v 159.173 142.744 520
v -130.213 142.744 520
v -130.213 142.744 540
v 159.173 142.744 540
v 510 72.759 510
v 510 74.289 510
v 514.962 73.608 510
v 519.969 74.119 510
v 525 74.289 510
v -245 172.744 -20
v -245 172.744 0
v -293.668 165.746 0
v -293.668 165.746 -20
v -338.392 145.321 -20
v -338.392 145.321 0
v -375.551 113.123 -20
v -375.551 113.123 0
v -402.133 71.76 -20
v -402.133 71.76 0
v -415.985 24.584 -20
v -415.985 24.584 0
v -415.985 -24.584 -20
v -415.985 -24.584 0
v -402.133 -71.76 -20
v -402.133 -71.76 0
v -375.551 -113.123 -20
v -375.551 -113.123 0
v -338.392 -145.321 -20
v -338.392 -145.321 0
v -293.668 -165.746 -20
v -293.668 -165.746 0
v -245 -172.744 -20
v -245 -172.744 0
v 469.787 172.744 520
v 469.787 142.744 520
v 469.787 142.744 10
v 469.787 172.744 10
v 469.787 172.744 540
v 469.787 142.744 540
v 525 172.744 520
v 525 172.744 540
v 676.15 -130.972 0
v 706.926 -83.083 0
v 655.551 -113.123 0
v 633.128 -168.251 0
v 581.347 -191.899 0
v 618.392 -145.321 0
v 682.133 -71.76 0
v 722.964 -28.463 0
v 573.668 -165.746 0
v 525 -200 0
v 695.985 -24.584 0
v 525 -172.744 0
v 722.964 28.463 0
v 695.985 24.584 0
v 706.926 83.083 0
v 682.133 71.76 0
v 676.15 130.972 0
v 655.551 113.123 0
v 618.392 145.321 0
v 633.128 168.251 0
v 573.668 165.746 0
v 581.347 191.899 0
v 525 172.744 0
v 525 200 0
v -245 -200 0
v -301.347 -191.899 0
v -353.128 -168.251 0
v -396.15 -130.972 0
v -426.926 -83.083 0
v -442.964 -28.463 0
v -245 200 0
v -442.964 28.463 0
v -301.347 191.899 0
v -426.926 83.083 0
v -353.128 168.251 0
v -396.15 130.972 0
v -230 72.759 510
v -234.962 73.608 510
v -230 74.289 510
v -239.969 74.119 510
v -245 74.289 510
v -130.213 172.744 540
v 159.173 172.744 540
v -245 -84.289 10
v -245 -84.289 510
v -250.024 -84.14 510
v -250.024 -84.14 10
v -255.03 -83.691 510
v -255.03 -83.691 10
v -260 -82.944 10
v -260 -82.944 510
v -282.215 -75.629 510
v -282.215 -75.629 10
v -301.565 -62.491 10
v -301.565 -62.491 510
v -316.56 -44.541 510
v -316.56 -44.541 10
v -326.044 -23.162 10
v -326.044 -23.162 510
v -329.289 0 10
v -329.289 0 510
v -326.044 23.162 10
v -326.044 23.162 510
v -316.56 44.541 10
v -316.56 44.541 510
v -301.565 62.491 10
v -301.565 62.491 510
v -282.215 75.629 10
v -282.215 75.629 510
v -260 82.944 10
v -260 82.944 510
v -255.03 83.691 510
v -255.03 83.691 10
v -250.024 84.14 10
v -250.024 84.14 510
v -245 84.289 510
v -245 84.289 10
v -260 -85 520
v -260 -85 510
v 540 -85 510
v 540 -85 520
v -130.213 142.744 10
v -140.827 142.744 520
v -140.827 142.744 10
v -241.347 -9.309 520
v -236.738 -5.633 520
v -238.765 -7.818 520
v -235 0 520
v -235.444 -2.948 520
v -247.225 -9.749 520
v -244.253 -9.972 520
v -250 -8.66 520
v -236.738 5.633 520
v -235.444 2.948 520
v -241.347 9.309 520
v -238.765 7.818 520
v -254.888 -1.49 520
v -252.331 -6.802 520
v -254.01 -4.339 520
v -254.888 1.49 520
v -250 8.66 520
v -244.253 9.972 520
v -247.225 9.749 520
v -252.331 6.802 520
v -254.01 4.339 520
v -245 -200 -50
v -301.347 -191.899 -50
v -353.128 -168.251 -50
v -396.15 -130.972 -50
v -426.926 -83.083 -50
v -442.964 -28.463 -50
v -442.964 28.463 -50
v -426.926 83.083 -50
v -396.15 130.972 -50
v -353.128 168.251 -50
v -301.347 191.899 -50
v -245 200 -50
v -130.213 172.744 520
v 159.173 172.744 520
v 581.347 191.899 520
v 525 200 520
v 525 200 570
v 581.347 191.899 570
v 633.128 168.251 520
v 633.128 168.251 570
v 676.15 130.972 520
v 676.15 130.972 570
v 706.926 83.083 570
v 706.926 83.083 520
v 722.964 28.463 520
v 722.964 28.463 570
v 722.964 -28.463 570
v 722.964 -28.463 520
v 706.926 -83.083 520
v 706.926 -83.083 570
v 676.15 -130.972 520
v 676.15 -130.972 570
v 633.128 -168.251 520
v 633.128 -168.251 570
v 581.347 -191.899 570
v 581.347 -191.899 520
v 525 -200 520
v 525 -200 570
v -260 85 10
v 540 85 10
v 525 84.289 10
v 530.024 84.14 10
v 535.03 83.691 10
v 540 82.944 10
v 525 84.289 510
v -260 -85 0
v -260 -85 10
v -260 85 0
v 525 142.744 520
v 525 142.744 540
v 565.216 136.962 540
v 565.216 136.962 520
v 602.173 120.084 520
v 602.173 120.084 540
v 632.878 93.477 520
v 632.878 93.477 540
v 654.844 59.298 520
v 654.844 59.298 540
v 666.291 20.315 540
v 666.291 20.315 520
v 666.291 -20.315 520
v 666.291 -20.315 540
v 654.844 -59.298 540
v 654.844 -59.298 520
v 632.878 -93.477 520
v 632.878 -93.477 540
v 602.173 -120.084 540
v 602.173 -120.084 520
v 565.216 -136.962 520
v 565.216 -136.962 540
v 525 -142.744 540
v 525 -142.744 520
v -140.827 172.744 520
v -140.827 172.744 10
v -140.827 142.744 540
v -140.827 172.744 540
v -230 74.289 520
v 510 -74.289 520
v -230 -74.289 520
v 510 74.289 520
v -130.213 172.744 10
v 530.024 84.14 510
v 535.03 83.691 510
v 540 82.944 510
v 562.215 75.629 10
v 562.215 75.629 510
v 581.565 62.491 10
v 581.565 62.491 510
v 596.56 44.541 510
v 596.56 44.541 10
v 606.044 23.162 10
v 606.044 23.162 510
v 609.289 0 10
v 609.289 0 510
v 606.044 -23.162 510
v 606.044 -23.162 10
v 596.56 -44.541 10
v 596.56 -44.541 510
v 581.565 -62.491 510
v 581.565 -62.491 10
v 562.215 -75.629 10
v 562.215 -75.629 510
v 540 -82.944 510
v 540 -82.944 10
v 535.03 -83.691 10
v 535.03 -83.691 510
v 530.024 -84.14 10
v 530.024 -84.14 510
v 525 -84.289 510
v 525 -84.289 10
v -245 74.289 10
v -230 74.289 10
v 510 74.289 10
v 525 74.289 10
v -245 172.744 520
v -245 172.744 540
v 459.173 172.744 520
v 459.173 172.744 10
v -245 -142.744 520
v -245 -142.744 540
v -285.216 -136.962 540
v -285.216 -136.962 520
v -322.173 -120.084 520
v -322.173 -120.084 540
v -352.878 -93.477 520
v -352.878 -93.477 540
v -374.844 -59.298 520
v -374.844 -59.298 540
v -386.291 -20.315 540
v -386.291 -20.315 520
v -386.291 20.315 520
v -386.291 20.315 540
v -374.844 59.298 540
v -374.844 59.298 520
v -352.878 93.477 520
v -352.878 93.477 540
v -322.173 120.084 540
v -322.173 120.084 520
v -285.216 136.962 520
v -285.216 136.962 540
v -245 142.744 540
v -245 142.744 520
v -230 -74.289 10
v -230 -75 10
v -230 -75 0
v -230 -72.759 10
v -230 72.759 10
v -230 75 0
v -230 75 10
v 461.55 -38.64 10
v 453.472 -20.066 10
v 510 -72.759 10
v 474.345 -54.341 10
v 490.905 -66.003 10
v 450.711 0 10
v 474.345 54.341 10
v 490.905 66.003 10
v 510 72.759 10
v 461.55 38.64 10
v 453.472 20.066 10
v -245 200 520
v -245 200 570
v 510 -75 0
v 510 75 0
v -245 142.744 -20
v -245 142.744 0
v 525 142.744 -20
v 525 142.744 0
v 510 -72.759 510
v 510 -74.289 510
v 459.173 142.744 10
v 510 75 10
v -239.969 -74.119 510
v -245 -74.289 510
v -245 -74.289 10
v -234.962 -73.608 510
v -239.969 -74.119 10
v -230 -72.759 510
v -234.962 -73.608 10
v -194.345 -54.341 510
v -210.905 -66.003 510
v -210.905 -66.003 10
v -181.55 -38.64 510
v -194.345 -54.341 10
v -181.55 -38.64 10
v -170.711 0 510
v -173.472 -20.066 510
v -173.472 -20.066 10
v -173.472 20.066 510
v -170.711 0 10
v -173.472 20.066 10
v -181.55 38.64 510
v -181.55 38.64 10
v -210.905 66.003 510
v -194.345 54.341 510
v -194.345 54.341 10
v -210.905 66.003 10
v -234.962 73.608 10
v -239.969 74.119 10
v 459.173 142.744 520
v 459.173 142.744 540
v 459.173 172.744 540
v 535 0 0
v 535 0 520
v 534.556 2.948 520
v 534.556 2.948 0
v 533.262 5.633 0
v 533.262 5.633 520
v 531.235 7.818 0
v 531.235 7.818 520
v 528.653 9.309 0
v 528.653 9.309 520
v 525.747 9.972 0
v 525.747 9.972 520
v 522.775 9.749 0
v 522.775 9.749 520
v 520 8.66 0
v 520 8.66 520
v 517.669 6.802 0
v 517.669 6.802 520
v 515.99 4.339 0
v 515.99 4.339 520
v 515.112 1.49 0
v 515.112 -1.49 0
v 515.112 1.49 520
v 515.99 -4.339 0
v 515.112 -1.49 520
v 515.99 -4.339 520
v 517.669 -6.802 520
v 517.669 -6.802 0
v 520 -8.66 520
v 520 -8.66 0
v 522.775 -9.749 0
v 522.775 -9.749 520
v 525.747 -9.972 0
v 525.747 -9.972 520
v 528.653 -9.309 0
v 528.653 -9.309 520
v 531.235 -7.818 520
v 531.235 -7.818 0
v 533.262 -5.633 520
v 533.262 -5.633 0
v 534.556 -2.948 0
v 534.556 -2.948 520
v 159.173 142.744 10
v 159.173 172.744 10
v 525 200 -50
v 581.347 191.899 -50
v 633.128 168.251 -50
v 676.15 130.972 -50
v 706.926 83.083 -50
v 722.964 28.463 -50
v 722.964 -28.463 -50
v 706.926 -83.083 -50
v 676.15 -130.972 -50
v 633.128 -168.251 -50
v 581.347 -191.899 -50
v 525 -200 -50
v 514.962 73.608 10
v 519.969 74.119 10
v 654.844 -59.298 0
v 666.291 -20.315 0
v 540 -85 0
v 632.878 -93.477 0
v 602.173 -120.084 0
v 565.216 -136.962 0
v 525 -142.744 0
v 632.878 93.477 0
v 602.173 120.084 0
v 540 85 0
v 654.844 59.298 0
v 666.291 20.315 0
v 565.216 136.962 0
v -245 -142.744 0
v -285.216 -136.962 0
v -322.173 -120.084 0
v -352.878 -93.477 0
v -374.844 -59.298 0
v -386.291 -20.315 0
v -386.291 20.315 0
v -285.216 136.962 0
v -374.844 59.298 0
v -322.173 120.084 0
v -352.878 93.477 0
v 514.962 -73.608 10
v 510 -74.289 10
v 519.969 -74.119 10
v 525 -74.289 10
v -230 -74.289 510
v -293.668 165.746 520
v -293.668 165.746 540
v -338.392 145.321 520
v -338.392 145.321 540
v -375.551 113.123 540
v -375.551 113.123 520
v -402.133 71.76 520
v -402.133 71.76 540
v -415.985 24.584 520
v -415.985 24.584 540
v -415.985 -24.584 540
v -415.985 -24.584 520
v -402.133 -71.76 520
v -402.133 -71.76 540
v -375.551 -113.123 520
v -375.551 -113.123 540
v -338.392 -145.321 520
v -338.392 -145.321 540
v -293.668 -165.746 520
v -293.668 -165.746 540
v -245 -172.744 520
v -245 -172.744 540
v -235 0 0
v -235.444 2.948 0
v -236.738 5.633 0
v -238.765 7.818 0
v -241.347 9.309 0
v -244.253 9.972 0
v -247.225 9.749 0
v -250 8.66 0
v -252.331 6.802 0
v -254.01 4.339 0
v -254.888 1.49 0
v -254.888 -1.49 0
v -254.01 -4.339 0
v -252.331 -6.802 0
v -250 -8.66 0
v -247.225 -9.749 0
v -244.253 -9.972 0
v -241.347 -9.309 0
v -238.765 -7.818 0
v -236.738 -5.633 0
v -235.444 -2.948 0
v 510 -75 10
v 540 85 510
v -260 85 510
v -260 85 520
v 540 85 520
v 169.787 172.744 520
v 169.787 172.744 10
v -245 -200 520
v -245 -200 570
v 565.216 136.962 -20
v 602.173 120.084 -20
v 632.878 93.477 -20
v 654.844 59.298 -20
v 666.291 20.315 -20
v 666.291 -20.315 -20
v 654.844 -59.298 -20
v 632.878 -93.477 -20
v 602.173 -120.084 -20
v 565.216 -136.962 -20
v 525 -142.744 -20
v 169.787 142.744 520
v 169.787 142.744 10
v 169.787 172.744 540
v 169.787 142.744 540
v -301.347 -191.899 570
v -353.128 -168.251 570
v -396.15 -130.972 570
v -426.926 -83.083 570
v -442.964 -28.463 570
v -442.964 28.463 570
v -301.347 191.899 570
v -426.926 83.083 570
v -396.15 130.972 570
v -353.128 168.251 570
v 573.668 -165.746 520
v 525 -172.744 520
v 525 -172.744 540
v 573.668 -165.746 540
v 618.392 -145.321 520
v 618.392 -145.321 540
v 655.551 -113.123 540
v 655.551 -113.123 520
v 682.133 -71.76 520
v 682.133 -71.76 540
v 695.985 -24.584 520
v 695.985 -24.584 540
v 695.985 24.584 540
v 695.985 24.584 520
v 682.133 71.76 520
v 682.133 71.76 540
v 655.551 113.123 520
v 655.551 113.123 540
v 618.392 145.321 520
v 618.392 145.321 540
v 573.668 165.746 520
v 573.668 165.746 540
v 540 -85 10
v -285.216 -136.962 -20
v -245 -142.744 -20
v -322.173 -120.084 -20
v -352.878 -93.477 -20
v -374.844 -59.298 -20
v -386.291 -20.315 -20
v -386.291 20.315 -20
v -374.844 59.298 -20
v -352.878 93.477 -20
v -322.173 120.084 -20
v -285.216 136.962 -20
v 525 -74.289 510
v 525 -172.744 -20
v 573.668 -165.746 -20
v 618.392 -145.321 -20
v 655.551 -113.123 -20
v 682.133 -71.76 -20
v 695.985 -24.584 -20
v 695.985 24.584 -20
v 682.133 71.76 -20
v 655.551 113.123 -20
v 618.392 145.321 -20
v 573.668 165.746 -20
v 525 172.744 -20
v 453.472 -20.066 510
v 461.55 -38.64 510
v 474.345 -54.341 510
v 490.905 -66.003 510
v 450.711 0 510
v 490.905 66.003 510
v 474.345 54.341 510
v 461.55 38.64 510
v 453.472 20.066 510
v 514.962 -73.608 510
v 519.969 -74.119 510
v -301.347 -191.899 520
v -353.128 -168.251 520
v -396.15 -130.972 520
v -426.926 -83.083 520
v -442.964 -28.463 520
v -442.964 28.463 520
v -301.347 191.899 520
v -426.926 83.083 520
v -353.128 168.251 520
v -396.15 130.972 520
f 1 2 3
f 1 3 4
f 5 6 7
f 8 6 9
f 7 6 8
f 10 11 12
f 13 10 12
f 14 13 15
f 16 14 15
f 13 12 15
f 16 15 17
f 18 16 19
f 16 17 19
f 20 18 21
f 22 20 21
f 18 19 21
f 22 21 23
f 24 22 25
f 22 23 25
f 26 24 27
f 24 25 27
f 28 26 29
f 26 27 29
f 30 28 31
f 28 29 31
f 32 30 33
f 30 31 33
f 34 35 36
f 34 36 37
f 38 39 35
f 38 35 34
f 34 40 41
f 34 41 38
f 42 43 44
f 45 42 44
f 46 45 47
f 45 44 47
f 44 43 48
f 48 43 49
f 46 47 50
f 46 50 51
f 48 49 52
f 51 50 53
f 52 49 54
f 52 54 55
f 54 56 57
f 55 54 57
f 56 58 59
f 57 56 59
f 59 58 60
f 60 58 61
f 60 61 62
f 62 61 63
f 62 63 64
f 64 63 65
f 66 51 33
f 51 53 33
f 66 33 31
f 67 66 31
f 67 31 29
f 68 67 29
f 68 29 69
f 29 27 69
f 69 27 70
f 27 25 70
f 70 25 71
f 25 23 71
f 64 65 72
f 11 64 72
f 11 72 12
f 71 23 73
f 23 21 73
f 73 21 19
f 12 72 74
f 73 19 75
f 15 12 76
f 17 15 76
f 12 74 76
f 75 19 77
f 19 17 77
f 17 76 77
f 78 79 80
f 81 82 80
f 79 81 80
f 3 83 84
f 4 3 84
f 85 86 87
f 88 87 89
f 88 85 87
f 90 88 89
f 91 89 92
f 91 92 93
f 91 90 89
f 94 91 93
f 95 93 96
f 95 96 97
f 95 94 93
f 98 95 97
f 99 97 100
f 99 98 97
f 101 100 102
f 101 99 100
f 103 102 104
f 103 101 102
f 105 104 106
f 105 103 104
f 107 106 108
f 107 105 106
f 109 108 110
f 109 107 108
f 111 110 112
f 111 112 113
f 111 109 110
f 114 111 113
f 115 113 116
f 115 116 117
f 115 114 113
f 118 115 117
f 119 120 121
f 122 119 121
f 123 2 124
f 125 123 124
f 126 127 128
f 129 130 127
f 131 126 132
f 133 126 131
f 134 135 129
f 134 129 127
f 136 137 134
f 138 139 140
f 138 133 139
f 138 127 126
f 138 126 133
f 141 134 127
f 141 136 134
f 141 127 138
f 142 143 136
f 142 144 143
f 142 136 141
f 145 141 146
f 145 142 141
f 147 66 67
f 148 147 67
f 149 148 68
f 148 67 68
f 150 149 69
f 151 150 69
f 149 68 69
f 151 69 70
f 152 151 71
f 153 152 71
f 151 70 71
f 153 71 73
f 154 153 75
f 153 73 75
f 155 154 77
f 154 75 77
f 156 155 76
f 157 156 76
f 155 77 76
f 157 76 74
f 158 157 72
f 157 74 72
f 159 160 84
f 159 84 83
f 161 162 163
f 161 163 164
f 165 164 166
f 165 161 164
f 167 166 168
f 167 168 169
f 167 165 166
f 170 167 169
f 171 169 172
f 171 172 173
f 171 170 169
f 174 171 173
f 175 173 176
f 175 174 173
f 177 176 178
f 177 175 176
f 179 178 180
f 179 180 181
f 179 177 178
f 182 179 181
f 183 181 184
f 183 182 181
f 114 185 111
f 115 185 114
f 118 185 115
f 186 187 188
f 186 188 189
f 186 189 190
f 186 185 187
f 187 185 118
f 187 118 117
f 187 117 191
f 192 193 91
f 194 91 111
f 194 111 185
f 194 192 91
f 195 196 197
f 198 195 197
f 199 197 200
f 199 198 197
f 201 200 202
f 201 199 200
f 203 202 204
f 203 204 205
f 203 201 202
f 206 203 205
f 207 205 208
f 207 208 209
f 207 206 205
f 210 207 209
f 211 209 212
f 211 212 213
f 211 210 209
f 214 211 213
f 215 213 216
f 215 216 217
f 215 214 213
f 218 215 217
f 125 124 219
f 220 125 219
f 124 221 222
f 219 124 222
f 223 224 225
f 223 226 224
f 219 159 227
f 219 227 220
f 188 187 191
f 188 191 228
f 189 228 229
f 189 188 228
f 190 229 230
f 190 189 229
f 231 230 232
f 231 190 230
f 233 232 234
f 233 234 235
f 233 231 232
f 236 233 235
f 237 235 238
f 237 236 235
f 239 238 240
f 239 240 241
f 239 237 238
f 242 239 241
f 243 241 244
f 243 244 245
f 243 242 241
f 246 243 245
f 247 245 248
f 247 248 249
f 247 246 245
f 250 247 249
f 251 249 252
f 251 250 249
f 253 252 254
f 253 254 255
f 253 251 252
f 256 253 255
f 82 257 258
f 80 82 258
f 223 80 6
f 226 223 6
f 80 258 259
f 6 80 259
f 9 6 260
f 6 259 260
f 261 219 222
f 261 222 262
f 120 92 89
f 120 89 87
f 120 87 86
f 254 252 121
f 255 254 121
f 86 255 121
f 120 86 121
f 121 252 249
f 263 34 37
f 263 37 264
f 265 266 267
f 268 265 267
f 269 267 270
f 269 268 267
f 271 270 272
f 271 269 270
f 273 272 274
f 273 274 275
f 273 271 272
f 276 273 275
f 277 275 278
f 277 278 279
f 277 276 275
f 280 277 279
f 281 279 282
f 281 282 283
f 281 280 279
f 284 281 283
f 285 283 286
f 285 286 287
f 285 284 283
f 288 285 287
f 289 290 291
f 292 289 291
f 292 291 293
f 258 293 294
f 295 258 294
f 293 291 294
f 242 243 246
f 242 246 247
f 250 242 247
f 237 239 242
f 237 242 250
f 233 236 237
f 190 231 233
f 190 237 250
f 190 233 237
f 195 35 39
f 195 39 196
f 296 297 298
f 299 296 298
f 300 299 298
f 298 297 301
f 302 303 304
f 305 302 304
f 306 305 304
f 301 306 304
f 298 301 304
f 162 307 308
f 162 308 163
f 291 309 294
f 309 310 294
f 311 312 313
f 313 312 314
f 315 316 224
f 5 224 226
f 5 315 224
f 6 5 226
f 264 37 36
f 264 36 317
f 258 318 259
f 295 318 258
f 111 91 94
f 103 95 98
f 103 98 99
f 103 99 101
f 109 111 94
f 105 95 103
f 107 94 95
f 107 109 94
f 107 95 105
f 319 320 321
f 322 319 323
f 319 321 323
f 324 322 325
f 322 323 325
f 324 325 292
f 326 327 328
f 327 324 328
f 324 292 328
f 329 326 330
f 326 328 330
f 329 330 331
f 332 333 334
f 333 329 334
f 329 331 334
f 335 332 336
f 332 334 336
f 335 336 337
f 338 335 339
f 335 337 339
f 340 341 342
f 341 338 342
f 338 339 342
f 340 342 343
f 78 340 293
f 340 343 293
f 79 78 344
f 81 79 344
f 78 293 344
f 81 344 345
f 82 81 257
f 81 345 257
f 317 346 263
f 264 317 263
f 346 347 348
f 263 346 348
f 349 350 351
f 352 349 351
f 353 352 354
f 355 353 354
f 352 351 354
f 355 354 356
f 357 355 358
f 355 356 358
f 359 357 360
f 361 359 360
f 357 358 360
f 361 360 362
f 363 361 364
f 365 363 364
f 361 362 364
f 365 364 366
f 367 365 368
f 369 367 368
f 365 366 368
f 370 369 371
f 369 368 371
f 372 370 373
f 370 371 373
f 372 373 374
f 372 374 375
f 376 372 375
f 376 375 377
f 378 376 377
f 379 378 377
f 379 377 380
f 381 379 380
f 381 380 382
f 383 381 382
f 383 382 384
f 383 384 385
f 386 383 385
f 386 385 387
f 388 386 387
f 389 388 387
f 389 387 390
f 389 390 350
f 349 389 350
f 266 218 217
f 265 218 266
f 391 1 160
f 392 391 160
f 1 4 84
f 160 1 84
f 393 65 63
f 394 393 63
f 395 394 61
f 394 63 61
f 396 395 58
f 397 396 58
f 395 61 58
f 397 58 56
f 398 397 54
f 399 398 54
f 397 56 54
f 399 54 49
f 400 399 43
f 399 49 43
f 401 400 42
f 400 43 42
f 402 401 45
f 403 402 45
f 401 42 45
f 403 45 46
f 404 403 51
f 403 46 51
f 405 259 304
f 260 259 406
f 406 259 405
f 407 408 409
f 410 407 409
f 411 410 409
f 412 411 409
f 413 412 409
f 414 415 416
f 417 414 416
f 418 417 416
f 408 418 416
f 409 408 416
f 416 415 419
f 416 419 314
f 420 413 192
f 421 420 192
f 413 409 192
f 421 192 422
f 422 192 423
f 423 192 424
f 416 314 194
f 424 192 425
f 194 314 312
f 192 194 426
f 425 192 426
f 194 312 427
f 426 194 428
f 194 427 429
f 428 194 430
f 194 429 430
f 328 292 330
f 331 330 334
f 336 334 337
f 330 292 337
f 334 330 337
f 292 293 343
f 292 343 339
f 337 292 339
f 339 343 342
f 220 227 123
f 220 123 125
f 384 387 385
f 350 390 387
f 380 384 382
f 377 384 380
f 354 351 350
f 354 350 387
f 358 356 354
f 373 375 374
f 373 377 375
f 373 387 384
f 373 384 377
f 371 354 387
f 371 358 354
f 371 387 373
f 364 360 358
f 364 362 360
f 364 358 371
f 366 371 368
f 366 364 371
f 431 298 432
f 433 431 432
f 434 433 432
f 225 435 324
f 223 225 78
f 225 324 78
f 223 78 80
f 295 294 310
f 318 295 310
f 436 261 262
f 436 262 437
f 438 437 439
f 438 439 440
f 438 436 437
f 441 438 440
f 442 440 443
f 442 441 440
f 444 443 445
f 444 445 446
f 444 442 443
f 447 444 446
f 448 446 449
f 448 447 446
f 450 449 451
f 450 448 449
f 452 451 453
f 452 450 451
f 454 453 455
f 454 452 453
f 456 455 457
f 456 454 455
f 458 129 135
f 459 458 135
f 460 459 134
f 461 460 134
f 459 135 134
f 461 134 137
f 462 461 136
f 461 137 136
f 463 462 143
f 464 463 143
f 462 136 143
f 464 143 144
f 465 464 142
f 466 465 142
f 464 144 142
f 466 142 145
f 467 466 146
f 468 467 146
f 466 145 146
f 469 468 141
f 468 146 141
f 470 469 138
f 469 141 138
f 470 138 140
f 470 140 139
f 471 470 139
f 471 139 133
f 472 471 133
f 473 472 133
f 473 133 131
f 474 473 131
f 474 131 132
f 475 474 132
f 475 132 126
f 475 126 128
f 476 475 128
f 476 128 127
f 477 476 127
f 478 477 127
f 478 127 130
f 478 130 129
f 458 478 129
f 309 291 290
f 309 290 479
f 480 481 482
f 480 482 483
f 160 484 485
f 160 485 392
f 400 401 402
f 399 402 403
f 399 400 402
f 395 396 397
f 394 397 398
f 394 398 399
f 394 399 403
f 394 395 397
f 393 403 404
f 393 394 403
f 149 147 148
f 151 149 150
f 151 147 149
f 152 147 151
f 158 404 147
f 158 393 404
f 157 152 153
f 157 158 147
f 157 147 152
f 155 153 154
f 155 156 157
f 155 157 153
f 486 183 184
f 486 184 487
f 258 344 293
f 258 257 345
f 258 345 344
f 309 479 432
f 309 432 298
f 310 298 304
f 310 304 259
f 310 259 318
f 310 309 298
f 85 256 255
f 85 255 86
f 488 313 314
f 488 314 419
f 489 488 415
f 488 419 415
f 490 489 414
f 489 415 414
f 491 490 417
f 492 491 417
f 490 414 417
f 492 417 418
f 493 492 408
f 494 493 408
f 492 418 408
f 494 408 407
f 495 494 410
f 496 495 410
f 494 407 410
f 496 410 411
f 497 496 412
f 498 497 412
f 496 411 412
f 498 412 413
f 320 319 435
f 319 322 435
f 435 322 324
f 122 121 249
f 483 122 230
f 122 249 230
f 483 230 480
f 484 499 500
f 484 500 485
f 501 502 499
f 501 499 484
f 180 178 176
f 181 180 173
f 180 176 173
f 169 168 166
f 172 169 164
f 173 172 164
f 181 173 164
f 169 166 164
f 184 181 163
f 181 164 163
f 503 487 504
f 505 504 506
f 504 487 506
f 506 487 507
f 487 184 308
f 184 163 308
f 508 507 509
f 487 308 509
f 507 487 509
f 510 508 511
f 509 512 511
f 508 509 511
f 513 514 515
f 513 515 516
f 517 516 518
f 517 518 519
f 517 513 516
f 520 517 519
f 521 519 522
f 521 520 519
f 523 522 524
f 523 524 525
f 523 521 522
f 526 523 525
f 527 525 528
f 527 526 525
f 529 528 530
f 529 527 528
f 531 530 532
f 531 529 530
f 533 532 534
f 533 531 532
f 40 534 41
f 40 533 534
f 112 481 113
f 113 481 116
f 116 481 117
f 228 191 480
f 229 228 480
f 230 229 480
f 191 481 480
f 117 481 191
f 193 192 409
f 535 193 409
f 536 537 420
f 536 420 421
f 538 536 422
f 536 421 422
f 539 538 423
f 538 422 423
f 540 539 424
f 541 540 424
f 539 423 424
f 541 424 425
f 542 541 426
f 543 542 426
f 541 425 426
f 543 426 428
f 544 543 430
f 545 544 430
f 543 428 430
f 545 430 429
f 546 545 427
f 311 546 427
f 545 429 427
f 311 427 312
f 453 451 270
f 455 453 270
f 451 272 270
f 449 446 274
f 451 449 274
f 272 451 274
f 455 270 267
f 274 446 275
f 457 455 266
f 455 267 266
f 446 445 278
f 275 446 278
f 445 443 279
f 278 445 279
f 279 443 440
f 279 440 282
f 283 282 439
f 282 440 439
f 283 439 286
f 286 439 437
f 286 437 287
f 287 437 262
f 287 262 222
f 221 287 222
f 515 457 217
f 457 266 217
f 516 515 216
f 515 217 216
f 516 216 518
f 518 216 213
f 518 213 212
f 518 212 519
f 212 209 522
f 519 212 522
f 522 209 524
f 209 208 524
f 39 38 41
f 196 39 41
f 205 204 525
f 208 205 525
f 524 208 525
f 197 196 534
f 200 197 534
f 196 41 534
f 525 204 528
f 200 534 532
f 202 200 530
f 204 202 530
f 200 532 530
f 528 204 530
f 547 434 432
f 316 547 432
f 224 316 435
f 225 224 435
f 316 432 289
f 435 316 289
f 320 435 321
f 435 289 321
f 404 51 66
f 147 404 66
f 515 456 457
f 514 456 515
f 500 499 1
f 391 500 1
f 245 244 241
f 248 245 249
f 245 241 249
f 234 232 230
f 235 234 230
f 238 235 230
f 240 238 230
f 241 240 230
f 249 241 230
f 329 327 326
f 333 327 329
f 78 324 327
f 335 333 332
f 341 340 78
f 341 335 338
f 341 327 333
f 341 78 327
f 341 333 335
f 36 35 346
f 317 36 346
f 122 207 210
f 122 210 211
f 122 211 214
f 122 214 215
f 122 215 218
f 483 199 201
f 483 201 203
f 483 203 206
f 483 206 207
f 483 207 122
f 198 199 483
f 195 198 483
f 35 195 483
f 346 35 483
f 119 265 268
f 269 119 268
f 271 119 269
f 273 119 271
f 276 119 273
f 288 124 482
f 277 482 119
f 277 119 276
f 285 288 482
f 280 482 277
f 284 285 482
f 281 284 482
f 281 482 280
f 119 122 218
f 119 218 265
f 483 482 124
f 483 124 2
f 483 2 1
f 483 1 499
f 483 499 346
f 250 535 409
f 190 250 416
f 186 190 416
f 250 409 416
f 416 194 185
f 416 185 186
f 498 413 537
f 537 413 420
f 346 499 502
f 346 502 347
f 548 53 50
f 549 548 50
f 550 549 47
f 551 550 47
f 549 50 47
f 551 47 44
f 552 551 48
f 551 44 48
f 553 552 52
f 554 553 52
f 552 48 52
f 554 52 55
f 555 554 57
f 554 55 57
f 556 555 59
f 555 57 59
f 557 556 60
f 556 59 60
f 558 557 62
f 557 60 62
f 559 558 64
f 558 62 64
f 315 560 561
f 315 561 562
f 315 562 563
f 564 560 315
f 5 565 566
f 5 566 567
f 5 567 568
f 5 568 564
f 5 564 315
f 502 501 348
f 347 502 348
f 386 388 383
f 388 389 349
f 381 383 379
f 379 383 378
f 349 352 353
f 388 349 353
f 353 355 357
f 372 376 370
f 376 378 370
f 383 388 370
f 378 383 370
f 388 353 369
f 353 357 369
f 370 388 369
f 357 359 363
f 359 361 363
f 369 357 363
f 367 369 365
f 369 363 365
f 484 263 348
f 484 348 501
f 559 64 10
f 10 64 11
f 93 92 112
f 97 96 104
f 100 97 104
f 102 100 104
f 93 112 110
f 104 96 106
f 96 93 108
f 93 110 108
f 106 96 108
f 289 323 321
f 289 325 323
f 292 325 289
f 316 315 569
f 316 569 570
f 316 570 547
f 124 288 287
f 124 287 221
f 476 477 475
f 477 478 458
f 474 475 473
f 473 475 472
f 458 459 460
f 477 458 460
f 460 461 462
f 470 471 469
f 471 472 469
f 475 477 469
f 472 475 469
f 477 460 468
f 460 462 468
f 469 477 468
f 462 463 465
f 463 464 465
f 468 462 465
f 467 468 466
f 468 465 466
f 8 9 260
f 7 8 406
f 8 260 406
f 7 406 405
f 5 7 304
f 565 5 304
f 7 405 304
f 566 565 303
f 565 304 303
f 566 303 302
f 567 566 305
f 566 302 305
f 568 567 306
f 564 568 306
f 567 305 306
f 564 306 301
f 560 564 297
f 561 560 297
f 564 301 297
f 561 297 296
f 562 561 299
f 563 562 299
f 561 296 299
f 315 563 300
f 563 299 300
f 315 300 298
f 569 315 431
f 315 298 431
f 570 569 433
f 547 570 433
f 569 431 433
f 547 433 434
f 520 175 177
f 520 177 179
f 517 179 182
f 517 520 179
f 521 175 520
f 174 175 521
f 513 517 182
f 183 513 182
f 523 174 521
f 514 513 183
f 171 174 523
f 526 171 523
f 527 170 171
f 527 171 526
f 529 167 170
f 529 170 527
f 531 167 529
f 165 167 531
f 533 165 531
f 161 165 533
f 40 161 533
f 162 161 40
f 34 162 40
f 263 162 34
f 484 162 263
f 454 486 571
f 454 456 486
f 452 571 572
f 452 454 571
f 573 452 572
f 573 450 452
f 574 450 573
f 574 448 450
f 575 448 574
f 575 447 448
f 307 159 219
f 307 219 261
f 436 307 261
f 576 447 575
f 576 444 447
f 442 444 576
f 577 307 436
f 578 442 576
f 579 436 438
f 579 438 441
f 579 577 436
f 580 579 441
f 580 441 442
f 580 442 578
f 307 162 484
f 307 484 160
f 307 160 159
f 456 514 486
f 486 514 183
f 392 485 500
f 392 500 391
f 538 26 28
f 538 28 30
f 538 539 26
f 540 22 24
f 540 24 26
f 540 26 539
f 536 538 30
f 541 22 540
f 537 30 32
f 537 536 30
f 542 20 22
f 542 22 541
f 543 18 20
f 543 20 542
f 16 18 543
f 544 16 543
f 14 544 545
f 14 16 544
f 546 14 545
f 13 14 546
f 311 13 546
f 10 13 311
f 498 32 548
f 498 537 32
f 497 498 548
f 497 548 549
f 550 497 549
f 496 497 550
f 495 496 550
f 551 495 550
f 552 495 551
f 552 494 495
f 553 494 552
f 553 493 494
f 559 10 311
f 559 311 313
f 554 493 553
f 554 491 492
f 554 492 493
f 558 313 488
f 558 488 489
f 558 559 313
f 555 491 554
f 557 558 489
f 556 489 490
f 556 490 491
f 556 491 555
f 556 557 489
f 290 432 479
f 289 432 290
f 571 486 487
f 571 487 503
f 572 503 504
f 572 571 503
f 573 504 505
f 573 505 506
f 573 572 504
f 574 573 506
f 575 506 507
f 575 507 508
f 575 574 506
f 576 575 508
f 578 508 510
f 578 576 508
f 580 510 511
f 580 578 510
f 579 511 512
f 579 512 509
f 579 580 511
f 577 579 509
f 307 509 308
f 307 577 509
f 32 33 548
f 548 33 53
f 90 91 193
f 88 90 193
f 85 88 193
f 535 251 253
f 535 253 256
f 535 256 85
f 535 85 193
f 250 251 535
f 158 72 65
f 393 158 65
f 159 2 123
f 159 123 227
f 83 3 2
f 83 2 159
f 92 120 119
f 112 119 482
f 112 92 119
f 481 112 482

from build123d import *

# Parameters (mm, degrees)
SKETCH3_W           = 800
SKETCH3_H           = 170
SKETCH3_W_2         = 740
SKETCH3_H_2         = 150
BOSS_EXTRUDE1_DEPTH = 10
BOSS_EXTRUDE2_DEPTH = 500
SKETCH5_W           = 800
SKETCH5_H           = 170
SKETCH5_W_2         = 740
SKETCH5_H_2         = 148.57875962
BOSS_EXTRUDE3_DEPTH = 10
SKETCH7_R           = 74.28937981
BOSS_EXTRUDE6_DEPTH = 500
SKETCH6_R           = 10
CUT_EXTRUDE1_DEPTH  = 521
BOSS_EXTRUDE8_DEPTH = 50
CUT_EXTRUDE2_DEPTH  = 20
SKETCH10_W          = 10.613943808
SKETCH10_H          = 30
BOSS_EXTRUDE9_DEPTH = 530


with BuildPart() as part:
    # Sketch3 → Boss-Extrude1 (new body)
    with BuildSketch(Plane.XY):
        with Locations((140, 0)):
            Rectangle(SKETCH3_W, SKETCH3_H)
        with Locations((140, 0)):
            Rectangle(SKETCH3_W_2, SKETCH3_H_2, mode=Mode.SUBTRACT)
    extrude(amount=BOSS_EXTRUDE1_DEPTH)

    # Sketch4 → Boss-Extrude2 (add)
    with BuildSketch(Plane.XY.offset(10)):
        with BuildLine():
            Line((-245, 84.28937981), (525, 84.28937981))
            ThreePointArc((525, 84.28937981), (609.28937981, 0), (525, -84.28937981))
            Line((525, -84.28937981), (-245, -84.28937981))
            ThreePointArc((-245, -84.28937981), (-329.28937981, 0), (-245, 84.28937981))
        make_face()
        with BuildLine():
            Line((-245, 74.28937981), (525, 74.28937981))
            ThreePointArc((525, 74.28937981), (599.28937981, 0), (525, -74.28937981))
            Line((525, -74.28937981), (-245, -74.28937981))
            ThreePointArc((-245, -74.28937981), (-319.28937981, 0), (-245, 74.28937981))
        make_face(mode=Mode.SUBTRACT)
    extrude(amount=BOSS_EXTRUDE2_DEPTH)

    # Sketch5 → Boss-Extrude3 (add)
    with BuildSketch(Plane.XY.offset(510)):
        with Locations((140, 0)):
            Rectangle(SKETCH5_W, SKETCH5_H)
        with Locations((140, 0)):
            Rectangle(SKETCH5_W_2, SKETCH5_H_2, mode=Mode.SUBTRACT)
    extrude(amount=BOSS_EXTRUDE3_DEPTH)

    # Sketch7 → Boss-Extrude6 (add)
    with BuildSketch(Plane.XY.offset(10)):
        with Locations((-245, 0)):
            Circle(SKETCH7_R)
        with Locations((525, 0)):
            Circle(SKETCH7_R)
    extrude(amount=BOSS_EXTRUDE6_DEPTH)

    # Sketch6 → Cut-Extrude1 (cut, through all)
    with BuildSketch(Plane.XY.offset(520)):
        with Locations((-245, 0)):
            Circle(SKETCH6_R)
        with Locations((525, 0)):
            Circle(SKETCH6_R)
    extrude(amount=-CUT_EXTRUDE1_DEPTH, mode=Mode.SUBTRACT)

    # Sketch8 → Boss-Extrude8 (add)
    with BuildSketch(Plane.XY.offset(520)):
        with BuildLine():
            Line((-245, 200), (525, 200))
            ThreePointArc((525, 200), (725, 0), (525, -200))
            Line((525, -200), (-245, -200))
            ThreePointArc((-245, -200), (-445, 0), (-245, 200))
        make_face()
    boss_extrude8 = extrude(amount=BOSS_EXTRUDE8_DEPTH)

    # Sketch9 → Cut-Extrude2 (cut)
    with BuildSketch(Plane(origin=(0, 0, 520), x_dir=(-1, 0, 0), z_dir=(0, 0, -1))):
        with BuildLine():
            Line((-525, 172.743663041), (245, 172.743663041))
            ThreePointArc((245, 172.743663041), (417.743663041, 0), (245, -172.743663041))
            Line((245, -172.743663041), (-525, -172.743663041))
            ThreePointArc((-525, -172.743663041), (-697.743663041, 0), (-525, 172.743663041))
        make_face()
        with BuildLine():
            Line((-525, -142.743663041), (245, -142.743663041))
            ThreePointArc((245, -142.743663041), (387.743663041, 0), (245, 142.743663041))
            Line((245, 142.743663041), (-525, 142.743663041))
            ThreePointArc((-525, 142.743663041), (-667.743663041, 0), (-525, -142.743663041))
        make_face(mode=Mode.SUBTRACT)
    cut_extrude2 = extrude(amount=-CUT_EXTRUDE2_DEPTH, mode=Mode.SUBTRACT)

    # Sketch10 → Boss-Extrude9 (add)
    with BuildSketch(Plane(origin=(0, 0, 540), x_dir=(-1, 0, 0), z_dir=(0, 0, -1))):
        with Locations((135.520291363, 157.743663041)):
            Rectangle(SKETCH10_W, SKETCH10_H)
        with Locations((-164.479708637, 157.743663041)):
            Rectangle(SKETCH10_W, SKETCH10_H)
        with Locations((-464.479708637, 157.743663041)):
            Rectangle(SKETCH10_W, SKETCH10_H)
    extrude(amount=BOSS_EXTRUDE9_DEPTH)

    # Mirror1: Boss-Extrude8, Cut-Extrude2 across plane
    add(boss_extrude8.mirror(Plane(origin=(0, 0, 260), x_dir=(1, 0, 0), z_dir=(0, 0, -1))))
    add(cut_extrude2.mirror(Plane(origin=(0, 0, 260), x_dir=(1, 0, 0), z_dir=(0, 0, -1))), mode=Mode.SUBTRACT)


solid = part.part
